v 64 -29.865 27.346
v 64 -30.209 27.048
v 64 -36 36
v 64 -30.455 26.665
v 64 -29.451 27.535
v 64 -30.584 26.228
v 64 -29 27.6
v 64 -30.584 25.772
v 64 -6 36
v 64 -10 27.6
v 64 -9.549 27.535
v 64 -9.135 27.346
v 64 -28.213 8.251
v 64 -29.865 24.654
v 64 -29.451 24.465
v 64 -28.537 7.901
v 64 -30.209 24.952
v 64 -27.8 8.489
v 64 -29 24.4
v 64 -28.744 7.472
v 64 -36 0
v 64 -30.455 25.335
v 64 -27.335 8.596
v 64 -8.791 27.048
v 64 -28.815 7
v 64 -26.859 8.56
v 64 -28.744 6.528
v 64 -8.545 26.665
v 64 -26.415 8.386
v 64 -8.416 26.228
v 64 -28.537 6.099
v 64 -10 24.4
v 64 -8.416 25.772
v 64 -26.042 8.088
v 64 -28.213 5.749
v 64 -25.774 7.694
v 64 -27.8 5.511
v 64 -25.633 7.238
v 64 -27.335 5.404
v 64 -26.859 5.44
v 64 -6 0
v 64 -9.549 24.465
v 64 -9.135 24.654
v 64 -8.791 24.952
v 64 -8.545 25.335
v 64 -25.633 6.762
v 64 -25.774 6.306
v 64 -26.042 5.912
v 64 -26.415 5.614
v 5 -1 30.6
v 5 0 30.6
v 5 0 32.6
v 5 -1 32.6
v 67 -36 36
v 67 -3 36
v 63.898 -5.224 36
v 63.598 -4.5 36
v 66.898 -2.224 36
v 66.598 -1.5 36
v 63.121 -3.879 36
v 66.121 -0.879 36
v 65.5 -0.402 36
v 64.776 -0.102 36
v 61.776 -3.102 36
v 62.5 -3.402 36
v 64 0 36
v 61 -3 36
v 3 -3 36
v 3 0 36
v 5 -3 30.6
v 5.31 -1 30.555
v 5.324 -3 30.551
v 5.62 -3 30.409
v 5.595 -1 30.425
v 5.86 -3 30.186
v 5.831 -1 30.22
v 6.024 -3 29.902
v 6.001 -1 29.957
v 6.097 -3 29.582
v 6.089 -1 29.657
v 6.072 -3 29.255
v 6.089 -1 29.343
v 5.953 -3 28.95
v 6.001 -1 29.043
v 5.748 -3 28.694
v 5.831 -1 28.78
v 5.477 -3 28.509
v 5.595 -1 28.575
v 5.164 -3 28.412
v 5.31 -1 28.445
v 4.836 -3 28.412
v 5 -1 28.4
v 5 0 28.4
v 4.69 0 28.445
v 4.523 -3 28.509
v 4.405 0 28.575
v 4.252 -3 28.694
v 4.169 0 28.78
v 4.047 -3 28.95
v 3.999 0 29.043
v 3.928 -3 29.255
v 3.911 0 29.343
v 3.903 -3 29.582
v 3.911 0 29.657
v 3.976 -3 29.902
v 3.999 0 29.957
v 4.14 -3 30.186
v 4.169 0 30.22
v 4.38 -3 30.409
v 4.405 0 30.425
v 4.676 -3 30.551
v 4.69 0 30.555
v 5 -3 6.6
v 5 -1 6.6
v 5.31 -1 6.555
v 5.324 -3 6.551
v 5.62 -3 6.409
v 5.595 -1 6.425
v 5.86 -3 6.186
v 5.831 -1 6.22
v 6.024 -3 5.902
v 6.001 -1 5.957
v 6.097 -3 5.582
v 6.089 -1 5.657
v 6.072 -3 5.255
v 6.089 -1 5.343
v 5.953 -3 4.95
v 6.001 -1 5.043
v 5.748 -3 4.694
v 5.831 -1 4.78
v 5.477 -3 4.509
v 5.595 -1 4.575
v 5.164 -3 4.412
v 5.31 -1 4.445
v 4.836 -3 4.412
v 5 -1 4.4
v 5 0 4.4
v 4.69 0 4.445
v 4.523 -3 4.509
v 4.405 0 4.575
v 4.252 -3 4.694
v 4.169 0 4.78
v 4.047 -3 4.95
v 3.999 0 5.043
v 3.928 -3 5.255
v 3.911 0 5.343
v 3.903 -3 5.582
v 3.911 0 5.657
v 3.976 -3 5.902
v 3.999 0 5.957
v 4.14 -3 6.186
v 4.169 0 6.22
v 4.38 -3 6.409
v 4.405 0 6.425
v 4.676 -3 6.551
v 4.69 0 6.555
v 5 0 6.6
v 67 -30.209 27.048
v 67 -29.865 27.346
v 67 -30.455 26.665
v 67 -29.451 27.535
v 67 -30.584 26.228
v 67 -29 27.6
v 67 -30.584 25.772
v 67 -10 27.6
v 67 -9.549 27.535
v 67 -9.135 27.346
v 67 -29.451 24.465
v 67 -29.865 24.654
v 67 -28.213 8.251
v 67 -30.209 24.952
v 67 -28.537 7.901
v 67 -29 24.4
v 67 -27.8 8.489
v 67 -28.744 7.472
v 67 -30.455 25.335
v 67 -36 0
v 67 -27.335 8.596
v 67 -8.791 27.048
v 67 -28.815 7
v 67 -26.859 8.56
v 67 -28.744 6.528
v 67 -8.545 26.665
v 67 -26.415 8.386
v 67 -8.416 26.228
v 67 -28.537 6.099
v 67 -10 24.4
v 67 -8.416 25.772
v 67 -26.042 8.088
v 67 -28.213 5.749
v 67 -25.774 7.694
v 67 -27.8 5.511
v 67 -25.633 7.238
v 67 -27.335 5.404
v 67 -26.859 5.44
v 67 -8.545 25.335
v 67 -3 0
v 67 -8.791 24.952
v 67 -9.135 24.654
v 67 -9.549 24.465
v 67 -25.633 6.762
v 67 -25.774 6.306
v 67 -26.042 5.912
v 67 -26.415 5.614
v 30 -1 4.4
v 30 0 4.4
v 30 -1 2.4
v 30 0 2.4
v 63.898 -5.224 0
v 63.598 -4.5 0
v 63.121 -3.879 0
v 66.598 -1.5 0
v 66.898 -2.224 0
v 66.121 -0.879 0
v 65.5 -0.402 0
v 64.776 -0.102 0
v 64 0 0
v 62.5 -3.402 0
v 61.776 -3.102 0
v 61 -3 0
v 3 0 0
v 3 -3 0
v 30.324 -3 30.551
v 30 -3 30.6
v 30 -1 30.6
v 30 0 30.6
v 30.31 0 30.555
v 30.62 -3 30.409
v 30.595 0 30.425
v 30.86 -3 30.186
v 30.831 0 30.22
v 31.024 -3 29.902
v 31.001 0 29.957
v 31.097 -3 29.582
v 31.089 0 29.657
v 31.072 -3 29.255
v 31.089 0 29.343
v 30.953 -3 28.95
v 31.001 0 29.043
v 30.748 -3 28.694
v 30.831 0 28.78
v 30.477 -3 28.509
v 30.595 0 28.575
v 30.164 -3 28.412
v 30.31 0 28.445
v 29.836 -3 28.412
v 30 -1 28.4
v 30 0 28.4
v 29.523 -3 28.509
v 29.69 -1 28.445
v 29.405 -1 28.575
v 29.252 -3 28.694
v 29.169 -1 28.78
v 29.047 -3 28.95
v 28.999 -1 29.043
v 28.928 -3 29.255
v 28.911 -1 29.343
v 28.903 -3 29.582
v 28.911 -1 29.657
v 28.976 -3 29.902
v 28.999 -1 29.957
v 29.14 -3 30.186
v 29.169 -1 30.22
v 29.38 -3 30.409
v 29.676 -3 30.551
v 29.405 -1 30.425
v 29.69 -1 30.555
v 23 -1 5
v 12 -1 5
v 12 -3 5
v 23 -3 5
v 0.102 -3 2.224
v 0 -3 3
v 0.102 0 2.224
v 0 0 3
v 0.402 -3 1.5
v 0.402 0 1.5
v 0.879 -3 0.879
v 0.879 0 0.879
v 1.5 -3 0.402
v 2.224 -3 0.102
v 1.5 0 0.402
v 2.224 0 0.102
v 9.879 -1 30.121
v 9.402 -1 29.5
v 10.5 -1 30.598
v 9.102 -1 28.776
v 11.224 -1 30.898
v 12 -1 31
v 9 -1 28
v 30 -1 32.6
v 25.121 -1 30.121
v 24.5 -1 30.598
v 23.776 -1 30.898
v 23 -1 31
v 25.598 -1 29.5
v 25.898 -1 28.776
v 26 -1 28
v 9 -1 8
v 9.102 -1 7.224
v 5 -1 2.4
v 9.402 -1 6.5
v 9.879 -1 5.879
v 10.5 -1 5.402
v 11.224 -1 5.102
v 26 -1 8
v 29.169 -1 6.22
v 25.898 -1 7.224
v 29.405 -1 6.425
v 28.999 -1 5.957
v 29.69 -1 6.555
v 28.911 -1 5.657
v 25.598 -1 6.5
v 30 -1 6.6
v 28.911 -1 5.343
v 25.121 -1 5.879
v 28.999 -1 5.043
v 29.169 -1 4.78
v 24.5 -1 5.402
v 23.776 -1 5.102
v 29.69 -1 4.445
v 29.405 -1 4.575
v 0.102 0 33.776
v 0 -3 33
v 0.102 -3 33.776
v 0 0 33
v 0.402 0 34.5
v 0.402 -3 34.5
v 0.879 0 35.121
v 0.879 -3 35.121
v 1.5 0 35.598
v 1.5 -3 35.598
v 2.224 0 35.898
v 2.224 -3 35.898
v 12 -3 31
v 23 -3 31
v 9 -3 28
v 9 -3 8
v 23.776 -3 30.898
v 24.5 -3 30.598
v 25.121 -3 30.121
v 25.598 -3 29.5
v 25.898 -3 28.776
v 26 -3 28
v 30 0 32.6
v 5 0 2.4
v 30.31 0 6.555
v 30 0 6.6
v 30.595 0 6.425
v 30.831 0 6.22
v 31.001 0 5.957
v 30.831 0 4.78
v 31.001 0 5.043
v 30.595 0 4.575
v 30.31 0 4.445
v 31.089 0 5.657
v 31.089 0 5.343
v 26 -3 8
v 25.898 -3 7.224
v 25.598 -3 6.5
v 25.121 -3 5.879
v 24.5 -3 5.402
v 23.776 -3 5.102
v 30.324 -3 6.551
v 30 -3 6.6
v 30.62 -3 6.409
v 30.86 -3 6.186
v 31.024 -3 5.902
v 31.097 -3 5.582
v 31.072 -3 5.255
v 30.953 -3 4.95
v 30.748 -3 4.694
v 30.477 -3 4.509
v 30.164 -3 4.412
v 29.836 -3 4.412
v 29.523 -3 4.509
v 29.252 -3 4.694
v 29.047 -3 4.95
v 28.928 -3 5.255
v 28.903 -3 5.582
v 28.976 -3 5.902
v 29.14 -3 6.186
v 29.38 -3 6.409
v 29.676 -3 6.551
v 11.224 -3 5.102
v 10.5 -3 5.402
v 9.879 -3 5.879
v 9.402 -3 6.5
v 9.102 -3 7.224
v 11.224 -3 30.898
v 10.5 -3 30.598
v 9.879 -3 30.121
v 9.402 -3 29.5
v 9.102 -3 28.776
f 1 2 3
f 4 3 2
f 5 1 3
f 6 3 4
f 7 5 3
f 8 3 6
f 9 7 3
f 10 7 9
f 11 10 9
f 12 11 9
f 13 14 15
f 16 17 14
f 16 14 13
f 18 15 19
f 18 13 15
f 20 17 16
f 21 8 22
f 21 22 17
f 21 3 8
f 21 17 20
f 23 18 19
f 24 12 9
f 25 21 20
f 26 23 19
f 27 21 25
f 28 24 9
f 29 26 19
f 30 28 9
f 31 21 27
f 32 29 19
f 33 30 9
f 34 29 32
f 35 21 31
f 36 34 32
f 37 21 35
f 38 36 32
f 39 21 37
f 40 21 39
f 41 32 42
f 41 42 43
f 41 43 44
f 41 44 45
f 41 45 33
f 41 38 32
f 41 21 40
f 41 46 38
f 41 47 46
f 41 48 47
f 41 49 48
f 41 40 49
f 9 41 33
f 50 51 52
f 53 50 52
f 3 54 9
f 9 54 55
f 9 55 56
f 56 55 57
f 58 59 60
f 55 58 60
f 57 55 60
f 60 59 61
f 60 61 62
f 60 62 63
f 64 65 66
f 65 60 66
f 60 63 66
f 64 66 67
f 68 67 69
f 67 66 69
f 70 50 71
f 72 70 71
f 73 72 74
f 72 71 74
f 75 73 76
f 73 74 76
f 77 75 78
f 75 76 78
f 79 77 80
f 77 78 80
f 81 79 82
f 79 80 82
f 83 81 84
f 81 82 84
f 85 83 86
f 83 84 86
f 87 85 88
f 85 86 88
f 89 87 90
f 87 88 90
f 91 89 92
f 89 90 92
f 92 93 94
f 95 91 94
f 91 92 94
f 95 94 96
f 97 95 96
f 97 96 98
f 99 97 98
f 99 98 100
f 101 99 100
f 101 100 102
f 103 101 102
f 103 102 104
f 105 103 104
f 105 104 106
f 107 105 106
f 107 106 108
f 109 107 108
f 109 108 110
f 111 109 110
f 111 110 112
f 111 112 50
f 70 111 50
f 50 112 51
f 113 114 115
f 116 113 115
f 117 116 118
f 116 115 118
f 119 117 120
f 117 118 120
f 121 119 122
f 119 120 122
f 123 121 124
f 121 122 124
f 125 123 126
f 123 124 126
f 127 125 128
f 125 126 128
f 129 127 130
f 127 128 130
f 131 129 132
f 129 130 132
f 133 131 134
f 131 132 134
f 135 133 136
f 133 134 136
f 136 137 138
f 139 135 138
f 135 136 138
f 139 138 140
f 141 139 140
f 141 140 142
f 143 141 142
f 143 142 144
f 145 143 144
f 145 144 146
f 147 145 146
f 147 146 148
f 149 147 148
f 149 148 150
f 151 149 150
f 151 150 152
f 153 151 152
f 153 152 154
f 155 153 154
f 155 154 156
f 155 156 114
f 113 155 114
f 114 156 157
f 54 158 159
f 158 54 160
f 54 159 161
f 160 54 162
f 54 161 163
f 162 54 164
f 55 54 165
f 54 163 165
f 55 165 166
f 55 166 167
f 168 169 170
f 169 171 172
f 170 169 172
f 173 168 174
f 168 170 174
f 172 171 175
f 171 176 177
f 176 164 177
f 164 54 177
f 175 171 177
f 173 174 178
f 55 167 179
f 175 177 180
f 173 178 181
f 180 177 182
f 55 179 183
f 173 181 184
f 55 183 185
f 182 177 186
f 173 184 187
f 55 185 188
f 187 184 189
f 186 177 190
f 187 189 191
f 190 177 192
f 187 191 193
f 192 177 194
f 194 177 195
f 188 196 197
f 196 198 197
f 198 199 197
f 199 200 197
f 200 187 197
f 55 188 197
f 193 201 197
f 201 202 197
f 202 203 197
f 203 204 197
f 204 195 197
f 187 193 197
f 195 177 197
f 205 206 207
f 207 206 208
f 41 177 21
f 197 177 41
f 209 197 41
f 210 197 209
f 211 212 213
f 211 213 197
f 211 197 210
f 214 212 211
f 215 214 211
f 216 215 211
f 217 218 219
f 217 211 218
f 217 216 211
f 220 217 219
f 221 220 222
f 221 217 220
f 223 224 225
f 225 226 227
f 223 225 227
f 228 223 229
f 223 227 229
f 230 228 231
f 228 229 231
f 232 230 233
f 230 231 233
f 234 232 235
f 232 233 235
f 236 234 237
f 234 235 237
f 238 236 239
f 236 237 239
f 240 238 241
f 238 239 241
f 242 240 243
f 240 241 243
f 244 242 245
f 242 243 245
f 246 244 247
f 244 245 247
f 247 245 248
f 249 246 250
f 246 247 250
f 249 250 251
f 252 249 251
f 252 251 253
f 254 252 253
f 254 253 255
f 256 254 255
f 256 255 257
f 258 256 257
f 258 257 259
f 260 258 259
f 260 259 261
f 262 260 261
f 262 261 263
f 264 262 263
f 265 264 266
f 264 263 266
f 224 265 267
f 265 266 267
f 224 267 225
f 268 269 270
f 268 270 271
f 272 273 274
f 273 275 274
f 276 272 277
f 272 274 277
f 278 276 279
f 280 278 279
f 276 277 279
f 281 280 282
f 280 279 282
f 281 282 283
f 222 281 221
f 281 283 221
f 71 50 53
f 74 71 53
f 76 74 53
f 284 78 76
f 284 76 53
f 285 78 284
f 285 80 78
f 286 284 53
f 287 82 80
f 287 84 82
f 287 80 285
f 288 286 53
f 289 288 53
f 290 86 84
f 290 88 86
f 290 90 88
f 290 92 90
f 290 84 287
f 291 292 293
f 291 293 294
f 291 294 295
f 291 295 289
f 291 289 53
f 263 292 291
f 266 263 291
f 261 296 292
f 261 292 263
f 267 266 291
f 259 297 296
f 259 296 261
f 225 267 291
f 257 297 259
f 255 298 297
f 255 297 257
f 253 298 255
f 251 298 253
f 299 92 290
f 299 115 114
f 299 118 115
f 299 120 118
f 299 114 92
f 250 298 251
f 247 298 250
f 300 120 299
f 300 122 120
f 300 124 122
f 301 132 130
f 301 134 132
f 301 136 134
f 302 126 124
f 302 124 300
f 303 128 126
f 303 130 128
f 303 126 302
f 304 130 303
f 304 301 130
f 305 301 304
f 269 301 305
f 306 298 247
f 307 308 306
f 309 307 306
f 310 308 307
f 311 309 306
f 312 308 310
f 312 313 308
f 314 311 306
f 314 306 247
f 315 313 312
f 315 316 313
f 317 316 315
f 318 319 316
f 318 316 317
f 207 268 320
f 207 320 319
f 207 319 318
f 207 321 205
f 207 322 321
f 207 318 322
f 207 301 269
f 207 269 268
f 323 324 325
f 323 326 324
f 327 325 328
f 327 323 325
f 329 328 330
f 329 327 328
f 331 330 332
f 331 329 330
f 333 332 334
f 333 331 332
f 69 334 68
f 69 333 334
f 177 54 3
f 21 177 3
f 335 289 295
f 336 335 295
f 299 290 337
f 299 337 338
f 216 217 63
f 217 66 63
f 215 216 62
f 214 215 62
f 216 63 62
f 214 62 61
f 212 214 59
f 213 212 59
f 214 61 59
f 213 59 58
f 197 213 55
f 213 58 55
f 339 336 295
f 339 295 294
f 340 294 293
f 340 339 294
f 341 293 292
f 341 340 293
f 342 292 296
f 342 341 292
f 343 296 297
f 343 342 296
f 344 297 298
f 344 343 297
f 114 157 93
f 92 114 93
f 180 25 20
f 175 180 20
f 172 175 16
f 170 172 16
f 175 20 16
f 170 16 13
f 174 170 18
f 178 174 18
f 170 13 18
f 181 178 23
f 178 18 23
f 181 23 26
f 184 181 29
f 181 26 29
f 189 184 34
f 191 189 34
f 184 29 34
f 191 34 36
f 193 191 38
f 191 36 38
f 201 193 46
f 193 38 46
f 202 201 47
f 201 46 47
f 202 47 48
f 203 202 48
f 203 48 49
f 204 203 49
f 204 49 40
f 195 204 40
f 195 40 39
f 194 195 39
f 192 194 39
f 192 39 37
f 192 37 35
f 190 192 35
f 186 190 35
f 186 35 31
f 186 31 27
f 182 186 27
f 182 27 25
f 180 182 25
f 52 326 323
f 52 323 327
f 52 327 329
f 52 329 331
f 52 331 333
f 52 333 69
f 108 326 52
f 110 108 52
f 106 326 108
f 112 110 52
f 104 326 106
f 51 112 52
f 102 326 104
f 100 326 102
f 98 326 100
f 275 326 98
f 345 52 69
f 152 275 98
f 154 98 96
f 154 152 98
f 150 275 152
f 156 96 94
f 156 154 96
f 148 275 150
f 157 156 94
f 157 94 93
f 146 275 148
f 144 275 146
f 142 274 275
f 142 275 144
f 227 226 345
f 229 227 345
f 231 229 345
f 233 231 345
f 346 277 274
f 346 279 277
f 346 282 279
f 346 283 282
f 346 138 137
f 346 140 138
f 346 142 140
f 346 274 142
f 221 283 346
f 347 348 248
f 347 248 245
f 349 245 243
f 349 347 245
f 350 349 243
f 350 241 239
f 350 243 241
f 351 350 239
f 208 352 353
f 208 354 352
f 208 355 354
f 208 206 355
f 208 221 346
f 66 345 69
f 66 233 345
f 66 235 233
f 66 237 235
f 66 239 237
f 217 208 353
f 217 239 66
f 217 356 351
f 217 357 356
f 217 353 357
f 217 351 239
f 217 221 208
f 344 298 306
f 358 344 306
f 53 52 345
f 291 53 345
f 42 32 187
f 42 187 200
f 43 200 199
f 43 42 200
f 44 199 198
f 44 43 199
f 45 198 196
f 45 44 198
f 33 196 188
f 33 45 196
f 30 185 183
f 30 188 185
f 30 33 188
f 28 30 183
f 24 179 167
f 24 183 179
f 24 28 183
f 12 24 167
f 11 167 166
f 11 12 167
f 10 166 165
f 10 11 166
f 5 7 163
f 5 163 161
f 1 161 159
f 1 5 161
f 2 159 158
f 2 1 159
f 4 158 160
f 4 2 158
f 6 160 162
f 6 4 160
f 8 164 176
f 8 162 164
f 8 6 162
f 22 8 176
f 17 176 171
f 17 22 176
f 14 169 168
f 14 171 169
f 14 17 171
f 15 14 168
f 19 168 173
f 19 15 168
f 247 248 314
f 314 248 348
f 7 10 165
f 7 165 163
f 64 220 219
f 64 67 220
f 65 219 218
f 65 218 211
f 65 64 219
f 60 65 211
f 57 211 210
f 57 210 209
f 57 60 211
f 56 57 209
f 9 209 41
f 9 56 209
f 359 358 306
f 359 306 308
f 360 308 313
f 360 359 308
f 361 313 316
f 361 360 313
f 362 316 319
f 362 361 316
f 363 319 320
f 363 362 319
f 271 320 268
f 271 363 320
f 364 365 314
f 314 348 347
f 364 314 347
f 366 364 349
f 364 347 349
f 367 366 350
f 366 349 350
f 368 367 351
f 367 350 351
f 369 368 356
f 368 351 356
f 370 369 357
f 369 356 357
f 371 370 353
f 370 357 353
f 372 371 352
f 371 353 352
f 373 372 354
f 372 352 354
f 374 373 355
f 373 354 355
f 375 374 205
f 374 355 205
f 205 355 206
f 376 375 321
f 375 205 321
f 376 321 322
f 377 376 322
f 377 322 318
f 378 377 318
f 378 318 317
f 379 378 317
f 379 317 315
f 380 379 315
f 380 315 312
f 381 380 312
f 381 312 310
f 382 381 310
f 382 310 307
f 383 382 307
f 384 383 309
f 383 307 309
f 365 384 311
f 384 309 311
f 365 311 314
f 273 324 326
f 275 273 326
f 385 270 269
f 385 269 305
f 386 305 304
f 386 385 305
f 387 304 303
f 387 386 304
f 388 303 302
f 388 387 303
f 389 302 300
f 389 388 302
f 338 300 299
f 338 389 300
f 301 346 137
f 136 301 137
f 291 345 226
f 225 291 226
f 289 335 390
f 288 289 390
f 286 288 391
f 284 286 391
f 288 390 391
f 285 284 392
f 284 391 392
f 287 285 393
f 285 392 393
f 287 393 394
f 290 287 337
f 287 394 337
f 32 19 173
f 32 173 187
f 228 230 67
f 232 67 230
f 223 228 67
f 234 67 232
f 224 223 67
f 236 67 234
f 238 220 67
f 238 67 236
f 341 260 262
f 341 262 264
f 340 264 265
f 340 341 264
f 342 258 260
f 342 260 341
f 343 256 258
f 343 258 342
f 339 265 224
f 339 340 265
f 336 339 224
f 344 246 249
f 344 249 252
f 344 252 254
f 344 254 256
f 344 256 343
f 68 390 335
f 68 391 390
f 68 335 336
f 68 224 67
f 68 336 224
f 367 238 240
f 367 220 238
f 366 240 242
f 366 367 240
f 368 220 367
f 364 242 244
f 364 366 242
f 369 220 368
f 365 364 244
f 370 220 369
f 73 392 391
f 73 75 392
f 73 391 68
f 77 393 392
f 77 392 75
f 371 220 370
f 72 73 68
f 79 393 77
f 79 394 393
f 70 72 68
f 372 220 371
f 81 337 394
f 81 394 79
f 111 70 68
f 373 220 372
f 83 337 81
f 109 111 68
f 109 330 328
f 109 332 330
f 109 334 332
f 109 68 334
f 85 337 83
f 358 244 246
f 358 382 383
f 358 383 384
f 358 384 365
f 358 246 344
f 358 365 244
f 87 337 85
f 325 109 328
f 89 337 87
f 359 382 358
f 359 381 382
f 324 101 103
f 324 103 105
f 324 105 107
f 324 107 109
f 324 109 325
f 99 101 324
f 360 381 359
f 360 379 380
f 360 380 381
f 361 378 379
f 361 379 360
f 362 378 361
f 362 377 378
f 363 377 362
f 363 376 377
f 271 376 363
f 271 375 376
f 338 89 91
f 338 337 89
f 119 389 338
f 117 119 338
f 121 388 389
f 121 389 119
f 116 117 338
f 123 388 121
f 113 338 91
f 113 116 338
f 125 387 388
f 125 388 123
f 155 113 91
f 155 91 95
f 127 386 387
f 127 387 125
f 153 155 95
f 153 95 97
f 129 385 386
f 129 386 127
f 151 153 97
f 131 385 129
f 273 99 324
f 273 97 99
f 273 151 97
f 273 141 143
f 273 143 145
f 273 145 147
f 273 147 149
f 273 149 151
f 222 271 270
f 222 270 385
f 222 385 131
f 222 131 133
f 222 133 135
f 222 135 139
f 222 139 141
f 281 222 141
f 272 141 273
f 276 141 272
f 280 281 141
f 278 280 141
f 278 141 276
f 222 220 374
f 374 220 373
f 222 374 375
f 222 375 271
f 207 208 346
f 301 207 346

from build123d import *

# Parameters (mm, degrees)
EXTRUDE_1_DEPTH     = 36
SKETCH_2_R          = 1.1
SKETCH_2_W          = 17
SKETCH_2_H          = 26
CUT_EXTRUDE_1_DEPTH = 12
SKETCH_3_R          = 1.6
CUT_EXTRUDE_2_DEPTH = 22
FILLET_1_R          = 3
CUT_EXTRUDE_3_DEPTH = 1


with BuildPart() as part:
    # 草图1 → 凸台-拉伸1 (new body)
    with BuildSketch(Plane.XY):
        Polygon((0, 0), (67, 0), (67, -2), (67, -36), (64, -36), (64, -3), (0, -3), align=None)
    extrude(amount=EXTRUDE_1_DEPTH)

    # 草图2 → 切除-拉伸1 (cut)
    with BuildSketch(Plane(origin=(0, 0, 0), x_dir=(1, 0, 0), z_dir=(0, 1, 0))):
        with Locations(Location((5, -5.5, 0), (0, 0, 270))):
            Circle(SKETCH_2_R)
        with Locations(Location((5, -29.5, 0), (0, 0, 270))):
            Circle(SKETCH_2_R)
        with Locations(Location((30, -5.5, 0), (0, 0, 270))):
            Circle(SKETCH_2_R)
        with Locations(Location((30, -29.5, 0), (0, 0, 270))):
            Circle(SKETCH_2_R)
        with Locations((17.5, -18)):
            Rectangle(SKETCH_2_W, SKETCH_2_H)
    extrude(amount=-CUT_EXTRUDE_1_DEPTH, mode=Mode.SUBTRACT)

    # 草图3 → 切除-拉伸2 (cut)
    with BuildSketch(Plane.ZY.offset(-64)):
        with Locations(Location((7, -27.215224582, 0), (0, 0, 270))):
            Circle(SKETCH_3_R)
        with BuildLine():
            Line((27.6, -10), (27.6, -29))
            ThreePointArc((27.6, -29), (26, -30.6), (24.4, -29))
            Line((24.4, -29), (24.4, -10))
            ThreePointArc((24.4, -10), (26, -8.4), (27.6, -10))
        make_face()
    extrude(amount=-CUT_EXTRUDE_2_DEPTH, mode=Mode.SUBTRACT)

    # 圆角1
    fillet_1_edges = [part.edges().sort_by_distance(p)[0] for p in [
        (0, -1.5, 0),
        (67, 0, 18),
        (64, -3, 18),
        (9, -1.5, 31),
        (9, -1.5, 5),
        (26, -1.5, 5),
        (26, -1.5, 31),
        (0, -1.5, 36),
    ]]
    fillet(fillet_1_edges, radius=FILLET_1_R)

    # 草图4 → 切除-拉伸3 (cut)
    with BuildSketch(Plane(origin=(0, 0, 0), x_dir=(1, 0, 0), z_dir=(0, 1, 0))):
        Polygon((5, -4.4), (5, -30.6), (5, -32.6), (30, -32.6), (30, -30.6), (30, -4.4), (30, -2.4), (5, -2.4), align=None)
    extrude(amount=-CUT_EXTRUDE_3_DEPTH, mode=Mode.SUBTRACT)


solid = part.part
